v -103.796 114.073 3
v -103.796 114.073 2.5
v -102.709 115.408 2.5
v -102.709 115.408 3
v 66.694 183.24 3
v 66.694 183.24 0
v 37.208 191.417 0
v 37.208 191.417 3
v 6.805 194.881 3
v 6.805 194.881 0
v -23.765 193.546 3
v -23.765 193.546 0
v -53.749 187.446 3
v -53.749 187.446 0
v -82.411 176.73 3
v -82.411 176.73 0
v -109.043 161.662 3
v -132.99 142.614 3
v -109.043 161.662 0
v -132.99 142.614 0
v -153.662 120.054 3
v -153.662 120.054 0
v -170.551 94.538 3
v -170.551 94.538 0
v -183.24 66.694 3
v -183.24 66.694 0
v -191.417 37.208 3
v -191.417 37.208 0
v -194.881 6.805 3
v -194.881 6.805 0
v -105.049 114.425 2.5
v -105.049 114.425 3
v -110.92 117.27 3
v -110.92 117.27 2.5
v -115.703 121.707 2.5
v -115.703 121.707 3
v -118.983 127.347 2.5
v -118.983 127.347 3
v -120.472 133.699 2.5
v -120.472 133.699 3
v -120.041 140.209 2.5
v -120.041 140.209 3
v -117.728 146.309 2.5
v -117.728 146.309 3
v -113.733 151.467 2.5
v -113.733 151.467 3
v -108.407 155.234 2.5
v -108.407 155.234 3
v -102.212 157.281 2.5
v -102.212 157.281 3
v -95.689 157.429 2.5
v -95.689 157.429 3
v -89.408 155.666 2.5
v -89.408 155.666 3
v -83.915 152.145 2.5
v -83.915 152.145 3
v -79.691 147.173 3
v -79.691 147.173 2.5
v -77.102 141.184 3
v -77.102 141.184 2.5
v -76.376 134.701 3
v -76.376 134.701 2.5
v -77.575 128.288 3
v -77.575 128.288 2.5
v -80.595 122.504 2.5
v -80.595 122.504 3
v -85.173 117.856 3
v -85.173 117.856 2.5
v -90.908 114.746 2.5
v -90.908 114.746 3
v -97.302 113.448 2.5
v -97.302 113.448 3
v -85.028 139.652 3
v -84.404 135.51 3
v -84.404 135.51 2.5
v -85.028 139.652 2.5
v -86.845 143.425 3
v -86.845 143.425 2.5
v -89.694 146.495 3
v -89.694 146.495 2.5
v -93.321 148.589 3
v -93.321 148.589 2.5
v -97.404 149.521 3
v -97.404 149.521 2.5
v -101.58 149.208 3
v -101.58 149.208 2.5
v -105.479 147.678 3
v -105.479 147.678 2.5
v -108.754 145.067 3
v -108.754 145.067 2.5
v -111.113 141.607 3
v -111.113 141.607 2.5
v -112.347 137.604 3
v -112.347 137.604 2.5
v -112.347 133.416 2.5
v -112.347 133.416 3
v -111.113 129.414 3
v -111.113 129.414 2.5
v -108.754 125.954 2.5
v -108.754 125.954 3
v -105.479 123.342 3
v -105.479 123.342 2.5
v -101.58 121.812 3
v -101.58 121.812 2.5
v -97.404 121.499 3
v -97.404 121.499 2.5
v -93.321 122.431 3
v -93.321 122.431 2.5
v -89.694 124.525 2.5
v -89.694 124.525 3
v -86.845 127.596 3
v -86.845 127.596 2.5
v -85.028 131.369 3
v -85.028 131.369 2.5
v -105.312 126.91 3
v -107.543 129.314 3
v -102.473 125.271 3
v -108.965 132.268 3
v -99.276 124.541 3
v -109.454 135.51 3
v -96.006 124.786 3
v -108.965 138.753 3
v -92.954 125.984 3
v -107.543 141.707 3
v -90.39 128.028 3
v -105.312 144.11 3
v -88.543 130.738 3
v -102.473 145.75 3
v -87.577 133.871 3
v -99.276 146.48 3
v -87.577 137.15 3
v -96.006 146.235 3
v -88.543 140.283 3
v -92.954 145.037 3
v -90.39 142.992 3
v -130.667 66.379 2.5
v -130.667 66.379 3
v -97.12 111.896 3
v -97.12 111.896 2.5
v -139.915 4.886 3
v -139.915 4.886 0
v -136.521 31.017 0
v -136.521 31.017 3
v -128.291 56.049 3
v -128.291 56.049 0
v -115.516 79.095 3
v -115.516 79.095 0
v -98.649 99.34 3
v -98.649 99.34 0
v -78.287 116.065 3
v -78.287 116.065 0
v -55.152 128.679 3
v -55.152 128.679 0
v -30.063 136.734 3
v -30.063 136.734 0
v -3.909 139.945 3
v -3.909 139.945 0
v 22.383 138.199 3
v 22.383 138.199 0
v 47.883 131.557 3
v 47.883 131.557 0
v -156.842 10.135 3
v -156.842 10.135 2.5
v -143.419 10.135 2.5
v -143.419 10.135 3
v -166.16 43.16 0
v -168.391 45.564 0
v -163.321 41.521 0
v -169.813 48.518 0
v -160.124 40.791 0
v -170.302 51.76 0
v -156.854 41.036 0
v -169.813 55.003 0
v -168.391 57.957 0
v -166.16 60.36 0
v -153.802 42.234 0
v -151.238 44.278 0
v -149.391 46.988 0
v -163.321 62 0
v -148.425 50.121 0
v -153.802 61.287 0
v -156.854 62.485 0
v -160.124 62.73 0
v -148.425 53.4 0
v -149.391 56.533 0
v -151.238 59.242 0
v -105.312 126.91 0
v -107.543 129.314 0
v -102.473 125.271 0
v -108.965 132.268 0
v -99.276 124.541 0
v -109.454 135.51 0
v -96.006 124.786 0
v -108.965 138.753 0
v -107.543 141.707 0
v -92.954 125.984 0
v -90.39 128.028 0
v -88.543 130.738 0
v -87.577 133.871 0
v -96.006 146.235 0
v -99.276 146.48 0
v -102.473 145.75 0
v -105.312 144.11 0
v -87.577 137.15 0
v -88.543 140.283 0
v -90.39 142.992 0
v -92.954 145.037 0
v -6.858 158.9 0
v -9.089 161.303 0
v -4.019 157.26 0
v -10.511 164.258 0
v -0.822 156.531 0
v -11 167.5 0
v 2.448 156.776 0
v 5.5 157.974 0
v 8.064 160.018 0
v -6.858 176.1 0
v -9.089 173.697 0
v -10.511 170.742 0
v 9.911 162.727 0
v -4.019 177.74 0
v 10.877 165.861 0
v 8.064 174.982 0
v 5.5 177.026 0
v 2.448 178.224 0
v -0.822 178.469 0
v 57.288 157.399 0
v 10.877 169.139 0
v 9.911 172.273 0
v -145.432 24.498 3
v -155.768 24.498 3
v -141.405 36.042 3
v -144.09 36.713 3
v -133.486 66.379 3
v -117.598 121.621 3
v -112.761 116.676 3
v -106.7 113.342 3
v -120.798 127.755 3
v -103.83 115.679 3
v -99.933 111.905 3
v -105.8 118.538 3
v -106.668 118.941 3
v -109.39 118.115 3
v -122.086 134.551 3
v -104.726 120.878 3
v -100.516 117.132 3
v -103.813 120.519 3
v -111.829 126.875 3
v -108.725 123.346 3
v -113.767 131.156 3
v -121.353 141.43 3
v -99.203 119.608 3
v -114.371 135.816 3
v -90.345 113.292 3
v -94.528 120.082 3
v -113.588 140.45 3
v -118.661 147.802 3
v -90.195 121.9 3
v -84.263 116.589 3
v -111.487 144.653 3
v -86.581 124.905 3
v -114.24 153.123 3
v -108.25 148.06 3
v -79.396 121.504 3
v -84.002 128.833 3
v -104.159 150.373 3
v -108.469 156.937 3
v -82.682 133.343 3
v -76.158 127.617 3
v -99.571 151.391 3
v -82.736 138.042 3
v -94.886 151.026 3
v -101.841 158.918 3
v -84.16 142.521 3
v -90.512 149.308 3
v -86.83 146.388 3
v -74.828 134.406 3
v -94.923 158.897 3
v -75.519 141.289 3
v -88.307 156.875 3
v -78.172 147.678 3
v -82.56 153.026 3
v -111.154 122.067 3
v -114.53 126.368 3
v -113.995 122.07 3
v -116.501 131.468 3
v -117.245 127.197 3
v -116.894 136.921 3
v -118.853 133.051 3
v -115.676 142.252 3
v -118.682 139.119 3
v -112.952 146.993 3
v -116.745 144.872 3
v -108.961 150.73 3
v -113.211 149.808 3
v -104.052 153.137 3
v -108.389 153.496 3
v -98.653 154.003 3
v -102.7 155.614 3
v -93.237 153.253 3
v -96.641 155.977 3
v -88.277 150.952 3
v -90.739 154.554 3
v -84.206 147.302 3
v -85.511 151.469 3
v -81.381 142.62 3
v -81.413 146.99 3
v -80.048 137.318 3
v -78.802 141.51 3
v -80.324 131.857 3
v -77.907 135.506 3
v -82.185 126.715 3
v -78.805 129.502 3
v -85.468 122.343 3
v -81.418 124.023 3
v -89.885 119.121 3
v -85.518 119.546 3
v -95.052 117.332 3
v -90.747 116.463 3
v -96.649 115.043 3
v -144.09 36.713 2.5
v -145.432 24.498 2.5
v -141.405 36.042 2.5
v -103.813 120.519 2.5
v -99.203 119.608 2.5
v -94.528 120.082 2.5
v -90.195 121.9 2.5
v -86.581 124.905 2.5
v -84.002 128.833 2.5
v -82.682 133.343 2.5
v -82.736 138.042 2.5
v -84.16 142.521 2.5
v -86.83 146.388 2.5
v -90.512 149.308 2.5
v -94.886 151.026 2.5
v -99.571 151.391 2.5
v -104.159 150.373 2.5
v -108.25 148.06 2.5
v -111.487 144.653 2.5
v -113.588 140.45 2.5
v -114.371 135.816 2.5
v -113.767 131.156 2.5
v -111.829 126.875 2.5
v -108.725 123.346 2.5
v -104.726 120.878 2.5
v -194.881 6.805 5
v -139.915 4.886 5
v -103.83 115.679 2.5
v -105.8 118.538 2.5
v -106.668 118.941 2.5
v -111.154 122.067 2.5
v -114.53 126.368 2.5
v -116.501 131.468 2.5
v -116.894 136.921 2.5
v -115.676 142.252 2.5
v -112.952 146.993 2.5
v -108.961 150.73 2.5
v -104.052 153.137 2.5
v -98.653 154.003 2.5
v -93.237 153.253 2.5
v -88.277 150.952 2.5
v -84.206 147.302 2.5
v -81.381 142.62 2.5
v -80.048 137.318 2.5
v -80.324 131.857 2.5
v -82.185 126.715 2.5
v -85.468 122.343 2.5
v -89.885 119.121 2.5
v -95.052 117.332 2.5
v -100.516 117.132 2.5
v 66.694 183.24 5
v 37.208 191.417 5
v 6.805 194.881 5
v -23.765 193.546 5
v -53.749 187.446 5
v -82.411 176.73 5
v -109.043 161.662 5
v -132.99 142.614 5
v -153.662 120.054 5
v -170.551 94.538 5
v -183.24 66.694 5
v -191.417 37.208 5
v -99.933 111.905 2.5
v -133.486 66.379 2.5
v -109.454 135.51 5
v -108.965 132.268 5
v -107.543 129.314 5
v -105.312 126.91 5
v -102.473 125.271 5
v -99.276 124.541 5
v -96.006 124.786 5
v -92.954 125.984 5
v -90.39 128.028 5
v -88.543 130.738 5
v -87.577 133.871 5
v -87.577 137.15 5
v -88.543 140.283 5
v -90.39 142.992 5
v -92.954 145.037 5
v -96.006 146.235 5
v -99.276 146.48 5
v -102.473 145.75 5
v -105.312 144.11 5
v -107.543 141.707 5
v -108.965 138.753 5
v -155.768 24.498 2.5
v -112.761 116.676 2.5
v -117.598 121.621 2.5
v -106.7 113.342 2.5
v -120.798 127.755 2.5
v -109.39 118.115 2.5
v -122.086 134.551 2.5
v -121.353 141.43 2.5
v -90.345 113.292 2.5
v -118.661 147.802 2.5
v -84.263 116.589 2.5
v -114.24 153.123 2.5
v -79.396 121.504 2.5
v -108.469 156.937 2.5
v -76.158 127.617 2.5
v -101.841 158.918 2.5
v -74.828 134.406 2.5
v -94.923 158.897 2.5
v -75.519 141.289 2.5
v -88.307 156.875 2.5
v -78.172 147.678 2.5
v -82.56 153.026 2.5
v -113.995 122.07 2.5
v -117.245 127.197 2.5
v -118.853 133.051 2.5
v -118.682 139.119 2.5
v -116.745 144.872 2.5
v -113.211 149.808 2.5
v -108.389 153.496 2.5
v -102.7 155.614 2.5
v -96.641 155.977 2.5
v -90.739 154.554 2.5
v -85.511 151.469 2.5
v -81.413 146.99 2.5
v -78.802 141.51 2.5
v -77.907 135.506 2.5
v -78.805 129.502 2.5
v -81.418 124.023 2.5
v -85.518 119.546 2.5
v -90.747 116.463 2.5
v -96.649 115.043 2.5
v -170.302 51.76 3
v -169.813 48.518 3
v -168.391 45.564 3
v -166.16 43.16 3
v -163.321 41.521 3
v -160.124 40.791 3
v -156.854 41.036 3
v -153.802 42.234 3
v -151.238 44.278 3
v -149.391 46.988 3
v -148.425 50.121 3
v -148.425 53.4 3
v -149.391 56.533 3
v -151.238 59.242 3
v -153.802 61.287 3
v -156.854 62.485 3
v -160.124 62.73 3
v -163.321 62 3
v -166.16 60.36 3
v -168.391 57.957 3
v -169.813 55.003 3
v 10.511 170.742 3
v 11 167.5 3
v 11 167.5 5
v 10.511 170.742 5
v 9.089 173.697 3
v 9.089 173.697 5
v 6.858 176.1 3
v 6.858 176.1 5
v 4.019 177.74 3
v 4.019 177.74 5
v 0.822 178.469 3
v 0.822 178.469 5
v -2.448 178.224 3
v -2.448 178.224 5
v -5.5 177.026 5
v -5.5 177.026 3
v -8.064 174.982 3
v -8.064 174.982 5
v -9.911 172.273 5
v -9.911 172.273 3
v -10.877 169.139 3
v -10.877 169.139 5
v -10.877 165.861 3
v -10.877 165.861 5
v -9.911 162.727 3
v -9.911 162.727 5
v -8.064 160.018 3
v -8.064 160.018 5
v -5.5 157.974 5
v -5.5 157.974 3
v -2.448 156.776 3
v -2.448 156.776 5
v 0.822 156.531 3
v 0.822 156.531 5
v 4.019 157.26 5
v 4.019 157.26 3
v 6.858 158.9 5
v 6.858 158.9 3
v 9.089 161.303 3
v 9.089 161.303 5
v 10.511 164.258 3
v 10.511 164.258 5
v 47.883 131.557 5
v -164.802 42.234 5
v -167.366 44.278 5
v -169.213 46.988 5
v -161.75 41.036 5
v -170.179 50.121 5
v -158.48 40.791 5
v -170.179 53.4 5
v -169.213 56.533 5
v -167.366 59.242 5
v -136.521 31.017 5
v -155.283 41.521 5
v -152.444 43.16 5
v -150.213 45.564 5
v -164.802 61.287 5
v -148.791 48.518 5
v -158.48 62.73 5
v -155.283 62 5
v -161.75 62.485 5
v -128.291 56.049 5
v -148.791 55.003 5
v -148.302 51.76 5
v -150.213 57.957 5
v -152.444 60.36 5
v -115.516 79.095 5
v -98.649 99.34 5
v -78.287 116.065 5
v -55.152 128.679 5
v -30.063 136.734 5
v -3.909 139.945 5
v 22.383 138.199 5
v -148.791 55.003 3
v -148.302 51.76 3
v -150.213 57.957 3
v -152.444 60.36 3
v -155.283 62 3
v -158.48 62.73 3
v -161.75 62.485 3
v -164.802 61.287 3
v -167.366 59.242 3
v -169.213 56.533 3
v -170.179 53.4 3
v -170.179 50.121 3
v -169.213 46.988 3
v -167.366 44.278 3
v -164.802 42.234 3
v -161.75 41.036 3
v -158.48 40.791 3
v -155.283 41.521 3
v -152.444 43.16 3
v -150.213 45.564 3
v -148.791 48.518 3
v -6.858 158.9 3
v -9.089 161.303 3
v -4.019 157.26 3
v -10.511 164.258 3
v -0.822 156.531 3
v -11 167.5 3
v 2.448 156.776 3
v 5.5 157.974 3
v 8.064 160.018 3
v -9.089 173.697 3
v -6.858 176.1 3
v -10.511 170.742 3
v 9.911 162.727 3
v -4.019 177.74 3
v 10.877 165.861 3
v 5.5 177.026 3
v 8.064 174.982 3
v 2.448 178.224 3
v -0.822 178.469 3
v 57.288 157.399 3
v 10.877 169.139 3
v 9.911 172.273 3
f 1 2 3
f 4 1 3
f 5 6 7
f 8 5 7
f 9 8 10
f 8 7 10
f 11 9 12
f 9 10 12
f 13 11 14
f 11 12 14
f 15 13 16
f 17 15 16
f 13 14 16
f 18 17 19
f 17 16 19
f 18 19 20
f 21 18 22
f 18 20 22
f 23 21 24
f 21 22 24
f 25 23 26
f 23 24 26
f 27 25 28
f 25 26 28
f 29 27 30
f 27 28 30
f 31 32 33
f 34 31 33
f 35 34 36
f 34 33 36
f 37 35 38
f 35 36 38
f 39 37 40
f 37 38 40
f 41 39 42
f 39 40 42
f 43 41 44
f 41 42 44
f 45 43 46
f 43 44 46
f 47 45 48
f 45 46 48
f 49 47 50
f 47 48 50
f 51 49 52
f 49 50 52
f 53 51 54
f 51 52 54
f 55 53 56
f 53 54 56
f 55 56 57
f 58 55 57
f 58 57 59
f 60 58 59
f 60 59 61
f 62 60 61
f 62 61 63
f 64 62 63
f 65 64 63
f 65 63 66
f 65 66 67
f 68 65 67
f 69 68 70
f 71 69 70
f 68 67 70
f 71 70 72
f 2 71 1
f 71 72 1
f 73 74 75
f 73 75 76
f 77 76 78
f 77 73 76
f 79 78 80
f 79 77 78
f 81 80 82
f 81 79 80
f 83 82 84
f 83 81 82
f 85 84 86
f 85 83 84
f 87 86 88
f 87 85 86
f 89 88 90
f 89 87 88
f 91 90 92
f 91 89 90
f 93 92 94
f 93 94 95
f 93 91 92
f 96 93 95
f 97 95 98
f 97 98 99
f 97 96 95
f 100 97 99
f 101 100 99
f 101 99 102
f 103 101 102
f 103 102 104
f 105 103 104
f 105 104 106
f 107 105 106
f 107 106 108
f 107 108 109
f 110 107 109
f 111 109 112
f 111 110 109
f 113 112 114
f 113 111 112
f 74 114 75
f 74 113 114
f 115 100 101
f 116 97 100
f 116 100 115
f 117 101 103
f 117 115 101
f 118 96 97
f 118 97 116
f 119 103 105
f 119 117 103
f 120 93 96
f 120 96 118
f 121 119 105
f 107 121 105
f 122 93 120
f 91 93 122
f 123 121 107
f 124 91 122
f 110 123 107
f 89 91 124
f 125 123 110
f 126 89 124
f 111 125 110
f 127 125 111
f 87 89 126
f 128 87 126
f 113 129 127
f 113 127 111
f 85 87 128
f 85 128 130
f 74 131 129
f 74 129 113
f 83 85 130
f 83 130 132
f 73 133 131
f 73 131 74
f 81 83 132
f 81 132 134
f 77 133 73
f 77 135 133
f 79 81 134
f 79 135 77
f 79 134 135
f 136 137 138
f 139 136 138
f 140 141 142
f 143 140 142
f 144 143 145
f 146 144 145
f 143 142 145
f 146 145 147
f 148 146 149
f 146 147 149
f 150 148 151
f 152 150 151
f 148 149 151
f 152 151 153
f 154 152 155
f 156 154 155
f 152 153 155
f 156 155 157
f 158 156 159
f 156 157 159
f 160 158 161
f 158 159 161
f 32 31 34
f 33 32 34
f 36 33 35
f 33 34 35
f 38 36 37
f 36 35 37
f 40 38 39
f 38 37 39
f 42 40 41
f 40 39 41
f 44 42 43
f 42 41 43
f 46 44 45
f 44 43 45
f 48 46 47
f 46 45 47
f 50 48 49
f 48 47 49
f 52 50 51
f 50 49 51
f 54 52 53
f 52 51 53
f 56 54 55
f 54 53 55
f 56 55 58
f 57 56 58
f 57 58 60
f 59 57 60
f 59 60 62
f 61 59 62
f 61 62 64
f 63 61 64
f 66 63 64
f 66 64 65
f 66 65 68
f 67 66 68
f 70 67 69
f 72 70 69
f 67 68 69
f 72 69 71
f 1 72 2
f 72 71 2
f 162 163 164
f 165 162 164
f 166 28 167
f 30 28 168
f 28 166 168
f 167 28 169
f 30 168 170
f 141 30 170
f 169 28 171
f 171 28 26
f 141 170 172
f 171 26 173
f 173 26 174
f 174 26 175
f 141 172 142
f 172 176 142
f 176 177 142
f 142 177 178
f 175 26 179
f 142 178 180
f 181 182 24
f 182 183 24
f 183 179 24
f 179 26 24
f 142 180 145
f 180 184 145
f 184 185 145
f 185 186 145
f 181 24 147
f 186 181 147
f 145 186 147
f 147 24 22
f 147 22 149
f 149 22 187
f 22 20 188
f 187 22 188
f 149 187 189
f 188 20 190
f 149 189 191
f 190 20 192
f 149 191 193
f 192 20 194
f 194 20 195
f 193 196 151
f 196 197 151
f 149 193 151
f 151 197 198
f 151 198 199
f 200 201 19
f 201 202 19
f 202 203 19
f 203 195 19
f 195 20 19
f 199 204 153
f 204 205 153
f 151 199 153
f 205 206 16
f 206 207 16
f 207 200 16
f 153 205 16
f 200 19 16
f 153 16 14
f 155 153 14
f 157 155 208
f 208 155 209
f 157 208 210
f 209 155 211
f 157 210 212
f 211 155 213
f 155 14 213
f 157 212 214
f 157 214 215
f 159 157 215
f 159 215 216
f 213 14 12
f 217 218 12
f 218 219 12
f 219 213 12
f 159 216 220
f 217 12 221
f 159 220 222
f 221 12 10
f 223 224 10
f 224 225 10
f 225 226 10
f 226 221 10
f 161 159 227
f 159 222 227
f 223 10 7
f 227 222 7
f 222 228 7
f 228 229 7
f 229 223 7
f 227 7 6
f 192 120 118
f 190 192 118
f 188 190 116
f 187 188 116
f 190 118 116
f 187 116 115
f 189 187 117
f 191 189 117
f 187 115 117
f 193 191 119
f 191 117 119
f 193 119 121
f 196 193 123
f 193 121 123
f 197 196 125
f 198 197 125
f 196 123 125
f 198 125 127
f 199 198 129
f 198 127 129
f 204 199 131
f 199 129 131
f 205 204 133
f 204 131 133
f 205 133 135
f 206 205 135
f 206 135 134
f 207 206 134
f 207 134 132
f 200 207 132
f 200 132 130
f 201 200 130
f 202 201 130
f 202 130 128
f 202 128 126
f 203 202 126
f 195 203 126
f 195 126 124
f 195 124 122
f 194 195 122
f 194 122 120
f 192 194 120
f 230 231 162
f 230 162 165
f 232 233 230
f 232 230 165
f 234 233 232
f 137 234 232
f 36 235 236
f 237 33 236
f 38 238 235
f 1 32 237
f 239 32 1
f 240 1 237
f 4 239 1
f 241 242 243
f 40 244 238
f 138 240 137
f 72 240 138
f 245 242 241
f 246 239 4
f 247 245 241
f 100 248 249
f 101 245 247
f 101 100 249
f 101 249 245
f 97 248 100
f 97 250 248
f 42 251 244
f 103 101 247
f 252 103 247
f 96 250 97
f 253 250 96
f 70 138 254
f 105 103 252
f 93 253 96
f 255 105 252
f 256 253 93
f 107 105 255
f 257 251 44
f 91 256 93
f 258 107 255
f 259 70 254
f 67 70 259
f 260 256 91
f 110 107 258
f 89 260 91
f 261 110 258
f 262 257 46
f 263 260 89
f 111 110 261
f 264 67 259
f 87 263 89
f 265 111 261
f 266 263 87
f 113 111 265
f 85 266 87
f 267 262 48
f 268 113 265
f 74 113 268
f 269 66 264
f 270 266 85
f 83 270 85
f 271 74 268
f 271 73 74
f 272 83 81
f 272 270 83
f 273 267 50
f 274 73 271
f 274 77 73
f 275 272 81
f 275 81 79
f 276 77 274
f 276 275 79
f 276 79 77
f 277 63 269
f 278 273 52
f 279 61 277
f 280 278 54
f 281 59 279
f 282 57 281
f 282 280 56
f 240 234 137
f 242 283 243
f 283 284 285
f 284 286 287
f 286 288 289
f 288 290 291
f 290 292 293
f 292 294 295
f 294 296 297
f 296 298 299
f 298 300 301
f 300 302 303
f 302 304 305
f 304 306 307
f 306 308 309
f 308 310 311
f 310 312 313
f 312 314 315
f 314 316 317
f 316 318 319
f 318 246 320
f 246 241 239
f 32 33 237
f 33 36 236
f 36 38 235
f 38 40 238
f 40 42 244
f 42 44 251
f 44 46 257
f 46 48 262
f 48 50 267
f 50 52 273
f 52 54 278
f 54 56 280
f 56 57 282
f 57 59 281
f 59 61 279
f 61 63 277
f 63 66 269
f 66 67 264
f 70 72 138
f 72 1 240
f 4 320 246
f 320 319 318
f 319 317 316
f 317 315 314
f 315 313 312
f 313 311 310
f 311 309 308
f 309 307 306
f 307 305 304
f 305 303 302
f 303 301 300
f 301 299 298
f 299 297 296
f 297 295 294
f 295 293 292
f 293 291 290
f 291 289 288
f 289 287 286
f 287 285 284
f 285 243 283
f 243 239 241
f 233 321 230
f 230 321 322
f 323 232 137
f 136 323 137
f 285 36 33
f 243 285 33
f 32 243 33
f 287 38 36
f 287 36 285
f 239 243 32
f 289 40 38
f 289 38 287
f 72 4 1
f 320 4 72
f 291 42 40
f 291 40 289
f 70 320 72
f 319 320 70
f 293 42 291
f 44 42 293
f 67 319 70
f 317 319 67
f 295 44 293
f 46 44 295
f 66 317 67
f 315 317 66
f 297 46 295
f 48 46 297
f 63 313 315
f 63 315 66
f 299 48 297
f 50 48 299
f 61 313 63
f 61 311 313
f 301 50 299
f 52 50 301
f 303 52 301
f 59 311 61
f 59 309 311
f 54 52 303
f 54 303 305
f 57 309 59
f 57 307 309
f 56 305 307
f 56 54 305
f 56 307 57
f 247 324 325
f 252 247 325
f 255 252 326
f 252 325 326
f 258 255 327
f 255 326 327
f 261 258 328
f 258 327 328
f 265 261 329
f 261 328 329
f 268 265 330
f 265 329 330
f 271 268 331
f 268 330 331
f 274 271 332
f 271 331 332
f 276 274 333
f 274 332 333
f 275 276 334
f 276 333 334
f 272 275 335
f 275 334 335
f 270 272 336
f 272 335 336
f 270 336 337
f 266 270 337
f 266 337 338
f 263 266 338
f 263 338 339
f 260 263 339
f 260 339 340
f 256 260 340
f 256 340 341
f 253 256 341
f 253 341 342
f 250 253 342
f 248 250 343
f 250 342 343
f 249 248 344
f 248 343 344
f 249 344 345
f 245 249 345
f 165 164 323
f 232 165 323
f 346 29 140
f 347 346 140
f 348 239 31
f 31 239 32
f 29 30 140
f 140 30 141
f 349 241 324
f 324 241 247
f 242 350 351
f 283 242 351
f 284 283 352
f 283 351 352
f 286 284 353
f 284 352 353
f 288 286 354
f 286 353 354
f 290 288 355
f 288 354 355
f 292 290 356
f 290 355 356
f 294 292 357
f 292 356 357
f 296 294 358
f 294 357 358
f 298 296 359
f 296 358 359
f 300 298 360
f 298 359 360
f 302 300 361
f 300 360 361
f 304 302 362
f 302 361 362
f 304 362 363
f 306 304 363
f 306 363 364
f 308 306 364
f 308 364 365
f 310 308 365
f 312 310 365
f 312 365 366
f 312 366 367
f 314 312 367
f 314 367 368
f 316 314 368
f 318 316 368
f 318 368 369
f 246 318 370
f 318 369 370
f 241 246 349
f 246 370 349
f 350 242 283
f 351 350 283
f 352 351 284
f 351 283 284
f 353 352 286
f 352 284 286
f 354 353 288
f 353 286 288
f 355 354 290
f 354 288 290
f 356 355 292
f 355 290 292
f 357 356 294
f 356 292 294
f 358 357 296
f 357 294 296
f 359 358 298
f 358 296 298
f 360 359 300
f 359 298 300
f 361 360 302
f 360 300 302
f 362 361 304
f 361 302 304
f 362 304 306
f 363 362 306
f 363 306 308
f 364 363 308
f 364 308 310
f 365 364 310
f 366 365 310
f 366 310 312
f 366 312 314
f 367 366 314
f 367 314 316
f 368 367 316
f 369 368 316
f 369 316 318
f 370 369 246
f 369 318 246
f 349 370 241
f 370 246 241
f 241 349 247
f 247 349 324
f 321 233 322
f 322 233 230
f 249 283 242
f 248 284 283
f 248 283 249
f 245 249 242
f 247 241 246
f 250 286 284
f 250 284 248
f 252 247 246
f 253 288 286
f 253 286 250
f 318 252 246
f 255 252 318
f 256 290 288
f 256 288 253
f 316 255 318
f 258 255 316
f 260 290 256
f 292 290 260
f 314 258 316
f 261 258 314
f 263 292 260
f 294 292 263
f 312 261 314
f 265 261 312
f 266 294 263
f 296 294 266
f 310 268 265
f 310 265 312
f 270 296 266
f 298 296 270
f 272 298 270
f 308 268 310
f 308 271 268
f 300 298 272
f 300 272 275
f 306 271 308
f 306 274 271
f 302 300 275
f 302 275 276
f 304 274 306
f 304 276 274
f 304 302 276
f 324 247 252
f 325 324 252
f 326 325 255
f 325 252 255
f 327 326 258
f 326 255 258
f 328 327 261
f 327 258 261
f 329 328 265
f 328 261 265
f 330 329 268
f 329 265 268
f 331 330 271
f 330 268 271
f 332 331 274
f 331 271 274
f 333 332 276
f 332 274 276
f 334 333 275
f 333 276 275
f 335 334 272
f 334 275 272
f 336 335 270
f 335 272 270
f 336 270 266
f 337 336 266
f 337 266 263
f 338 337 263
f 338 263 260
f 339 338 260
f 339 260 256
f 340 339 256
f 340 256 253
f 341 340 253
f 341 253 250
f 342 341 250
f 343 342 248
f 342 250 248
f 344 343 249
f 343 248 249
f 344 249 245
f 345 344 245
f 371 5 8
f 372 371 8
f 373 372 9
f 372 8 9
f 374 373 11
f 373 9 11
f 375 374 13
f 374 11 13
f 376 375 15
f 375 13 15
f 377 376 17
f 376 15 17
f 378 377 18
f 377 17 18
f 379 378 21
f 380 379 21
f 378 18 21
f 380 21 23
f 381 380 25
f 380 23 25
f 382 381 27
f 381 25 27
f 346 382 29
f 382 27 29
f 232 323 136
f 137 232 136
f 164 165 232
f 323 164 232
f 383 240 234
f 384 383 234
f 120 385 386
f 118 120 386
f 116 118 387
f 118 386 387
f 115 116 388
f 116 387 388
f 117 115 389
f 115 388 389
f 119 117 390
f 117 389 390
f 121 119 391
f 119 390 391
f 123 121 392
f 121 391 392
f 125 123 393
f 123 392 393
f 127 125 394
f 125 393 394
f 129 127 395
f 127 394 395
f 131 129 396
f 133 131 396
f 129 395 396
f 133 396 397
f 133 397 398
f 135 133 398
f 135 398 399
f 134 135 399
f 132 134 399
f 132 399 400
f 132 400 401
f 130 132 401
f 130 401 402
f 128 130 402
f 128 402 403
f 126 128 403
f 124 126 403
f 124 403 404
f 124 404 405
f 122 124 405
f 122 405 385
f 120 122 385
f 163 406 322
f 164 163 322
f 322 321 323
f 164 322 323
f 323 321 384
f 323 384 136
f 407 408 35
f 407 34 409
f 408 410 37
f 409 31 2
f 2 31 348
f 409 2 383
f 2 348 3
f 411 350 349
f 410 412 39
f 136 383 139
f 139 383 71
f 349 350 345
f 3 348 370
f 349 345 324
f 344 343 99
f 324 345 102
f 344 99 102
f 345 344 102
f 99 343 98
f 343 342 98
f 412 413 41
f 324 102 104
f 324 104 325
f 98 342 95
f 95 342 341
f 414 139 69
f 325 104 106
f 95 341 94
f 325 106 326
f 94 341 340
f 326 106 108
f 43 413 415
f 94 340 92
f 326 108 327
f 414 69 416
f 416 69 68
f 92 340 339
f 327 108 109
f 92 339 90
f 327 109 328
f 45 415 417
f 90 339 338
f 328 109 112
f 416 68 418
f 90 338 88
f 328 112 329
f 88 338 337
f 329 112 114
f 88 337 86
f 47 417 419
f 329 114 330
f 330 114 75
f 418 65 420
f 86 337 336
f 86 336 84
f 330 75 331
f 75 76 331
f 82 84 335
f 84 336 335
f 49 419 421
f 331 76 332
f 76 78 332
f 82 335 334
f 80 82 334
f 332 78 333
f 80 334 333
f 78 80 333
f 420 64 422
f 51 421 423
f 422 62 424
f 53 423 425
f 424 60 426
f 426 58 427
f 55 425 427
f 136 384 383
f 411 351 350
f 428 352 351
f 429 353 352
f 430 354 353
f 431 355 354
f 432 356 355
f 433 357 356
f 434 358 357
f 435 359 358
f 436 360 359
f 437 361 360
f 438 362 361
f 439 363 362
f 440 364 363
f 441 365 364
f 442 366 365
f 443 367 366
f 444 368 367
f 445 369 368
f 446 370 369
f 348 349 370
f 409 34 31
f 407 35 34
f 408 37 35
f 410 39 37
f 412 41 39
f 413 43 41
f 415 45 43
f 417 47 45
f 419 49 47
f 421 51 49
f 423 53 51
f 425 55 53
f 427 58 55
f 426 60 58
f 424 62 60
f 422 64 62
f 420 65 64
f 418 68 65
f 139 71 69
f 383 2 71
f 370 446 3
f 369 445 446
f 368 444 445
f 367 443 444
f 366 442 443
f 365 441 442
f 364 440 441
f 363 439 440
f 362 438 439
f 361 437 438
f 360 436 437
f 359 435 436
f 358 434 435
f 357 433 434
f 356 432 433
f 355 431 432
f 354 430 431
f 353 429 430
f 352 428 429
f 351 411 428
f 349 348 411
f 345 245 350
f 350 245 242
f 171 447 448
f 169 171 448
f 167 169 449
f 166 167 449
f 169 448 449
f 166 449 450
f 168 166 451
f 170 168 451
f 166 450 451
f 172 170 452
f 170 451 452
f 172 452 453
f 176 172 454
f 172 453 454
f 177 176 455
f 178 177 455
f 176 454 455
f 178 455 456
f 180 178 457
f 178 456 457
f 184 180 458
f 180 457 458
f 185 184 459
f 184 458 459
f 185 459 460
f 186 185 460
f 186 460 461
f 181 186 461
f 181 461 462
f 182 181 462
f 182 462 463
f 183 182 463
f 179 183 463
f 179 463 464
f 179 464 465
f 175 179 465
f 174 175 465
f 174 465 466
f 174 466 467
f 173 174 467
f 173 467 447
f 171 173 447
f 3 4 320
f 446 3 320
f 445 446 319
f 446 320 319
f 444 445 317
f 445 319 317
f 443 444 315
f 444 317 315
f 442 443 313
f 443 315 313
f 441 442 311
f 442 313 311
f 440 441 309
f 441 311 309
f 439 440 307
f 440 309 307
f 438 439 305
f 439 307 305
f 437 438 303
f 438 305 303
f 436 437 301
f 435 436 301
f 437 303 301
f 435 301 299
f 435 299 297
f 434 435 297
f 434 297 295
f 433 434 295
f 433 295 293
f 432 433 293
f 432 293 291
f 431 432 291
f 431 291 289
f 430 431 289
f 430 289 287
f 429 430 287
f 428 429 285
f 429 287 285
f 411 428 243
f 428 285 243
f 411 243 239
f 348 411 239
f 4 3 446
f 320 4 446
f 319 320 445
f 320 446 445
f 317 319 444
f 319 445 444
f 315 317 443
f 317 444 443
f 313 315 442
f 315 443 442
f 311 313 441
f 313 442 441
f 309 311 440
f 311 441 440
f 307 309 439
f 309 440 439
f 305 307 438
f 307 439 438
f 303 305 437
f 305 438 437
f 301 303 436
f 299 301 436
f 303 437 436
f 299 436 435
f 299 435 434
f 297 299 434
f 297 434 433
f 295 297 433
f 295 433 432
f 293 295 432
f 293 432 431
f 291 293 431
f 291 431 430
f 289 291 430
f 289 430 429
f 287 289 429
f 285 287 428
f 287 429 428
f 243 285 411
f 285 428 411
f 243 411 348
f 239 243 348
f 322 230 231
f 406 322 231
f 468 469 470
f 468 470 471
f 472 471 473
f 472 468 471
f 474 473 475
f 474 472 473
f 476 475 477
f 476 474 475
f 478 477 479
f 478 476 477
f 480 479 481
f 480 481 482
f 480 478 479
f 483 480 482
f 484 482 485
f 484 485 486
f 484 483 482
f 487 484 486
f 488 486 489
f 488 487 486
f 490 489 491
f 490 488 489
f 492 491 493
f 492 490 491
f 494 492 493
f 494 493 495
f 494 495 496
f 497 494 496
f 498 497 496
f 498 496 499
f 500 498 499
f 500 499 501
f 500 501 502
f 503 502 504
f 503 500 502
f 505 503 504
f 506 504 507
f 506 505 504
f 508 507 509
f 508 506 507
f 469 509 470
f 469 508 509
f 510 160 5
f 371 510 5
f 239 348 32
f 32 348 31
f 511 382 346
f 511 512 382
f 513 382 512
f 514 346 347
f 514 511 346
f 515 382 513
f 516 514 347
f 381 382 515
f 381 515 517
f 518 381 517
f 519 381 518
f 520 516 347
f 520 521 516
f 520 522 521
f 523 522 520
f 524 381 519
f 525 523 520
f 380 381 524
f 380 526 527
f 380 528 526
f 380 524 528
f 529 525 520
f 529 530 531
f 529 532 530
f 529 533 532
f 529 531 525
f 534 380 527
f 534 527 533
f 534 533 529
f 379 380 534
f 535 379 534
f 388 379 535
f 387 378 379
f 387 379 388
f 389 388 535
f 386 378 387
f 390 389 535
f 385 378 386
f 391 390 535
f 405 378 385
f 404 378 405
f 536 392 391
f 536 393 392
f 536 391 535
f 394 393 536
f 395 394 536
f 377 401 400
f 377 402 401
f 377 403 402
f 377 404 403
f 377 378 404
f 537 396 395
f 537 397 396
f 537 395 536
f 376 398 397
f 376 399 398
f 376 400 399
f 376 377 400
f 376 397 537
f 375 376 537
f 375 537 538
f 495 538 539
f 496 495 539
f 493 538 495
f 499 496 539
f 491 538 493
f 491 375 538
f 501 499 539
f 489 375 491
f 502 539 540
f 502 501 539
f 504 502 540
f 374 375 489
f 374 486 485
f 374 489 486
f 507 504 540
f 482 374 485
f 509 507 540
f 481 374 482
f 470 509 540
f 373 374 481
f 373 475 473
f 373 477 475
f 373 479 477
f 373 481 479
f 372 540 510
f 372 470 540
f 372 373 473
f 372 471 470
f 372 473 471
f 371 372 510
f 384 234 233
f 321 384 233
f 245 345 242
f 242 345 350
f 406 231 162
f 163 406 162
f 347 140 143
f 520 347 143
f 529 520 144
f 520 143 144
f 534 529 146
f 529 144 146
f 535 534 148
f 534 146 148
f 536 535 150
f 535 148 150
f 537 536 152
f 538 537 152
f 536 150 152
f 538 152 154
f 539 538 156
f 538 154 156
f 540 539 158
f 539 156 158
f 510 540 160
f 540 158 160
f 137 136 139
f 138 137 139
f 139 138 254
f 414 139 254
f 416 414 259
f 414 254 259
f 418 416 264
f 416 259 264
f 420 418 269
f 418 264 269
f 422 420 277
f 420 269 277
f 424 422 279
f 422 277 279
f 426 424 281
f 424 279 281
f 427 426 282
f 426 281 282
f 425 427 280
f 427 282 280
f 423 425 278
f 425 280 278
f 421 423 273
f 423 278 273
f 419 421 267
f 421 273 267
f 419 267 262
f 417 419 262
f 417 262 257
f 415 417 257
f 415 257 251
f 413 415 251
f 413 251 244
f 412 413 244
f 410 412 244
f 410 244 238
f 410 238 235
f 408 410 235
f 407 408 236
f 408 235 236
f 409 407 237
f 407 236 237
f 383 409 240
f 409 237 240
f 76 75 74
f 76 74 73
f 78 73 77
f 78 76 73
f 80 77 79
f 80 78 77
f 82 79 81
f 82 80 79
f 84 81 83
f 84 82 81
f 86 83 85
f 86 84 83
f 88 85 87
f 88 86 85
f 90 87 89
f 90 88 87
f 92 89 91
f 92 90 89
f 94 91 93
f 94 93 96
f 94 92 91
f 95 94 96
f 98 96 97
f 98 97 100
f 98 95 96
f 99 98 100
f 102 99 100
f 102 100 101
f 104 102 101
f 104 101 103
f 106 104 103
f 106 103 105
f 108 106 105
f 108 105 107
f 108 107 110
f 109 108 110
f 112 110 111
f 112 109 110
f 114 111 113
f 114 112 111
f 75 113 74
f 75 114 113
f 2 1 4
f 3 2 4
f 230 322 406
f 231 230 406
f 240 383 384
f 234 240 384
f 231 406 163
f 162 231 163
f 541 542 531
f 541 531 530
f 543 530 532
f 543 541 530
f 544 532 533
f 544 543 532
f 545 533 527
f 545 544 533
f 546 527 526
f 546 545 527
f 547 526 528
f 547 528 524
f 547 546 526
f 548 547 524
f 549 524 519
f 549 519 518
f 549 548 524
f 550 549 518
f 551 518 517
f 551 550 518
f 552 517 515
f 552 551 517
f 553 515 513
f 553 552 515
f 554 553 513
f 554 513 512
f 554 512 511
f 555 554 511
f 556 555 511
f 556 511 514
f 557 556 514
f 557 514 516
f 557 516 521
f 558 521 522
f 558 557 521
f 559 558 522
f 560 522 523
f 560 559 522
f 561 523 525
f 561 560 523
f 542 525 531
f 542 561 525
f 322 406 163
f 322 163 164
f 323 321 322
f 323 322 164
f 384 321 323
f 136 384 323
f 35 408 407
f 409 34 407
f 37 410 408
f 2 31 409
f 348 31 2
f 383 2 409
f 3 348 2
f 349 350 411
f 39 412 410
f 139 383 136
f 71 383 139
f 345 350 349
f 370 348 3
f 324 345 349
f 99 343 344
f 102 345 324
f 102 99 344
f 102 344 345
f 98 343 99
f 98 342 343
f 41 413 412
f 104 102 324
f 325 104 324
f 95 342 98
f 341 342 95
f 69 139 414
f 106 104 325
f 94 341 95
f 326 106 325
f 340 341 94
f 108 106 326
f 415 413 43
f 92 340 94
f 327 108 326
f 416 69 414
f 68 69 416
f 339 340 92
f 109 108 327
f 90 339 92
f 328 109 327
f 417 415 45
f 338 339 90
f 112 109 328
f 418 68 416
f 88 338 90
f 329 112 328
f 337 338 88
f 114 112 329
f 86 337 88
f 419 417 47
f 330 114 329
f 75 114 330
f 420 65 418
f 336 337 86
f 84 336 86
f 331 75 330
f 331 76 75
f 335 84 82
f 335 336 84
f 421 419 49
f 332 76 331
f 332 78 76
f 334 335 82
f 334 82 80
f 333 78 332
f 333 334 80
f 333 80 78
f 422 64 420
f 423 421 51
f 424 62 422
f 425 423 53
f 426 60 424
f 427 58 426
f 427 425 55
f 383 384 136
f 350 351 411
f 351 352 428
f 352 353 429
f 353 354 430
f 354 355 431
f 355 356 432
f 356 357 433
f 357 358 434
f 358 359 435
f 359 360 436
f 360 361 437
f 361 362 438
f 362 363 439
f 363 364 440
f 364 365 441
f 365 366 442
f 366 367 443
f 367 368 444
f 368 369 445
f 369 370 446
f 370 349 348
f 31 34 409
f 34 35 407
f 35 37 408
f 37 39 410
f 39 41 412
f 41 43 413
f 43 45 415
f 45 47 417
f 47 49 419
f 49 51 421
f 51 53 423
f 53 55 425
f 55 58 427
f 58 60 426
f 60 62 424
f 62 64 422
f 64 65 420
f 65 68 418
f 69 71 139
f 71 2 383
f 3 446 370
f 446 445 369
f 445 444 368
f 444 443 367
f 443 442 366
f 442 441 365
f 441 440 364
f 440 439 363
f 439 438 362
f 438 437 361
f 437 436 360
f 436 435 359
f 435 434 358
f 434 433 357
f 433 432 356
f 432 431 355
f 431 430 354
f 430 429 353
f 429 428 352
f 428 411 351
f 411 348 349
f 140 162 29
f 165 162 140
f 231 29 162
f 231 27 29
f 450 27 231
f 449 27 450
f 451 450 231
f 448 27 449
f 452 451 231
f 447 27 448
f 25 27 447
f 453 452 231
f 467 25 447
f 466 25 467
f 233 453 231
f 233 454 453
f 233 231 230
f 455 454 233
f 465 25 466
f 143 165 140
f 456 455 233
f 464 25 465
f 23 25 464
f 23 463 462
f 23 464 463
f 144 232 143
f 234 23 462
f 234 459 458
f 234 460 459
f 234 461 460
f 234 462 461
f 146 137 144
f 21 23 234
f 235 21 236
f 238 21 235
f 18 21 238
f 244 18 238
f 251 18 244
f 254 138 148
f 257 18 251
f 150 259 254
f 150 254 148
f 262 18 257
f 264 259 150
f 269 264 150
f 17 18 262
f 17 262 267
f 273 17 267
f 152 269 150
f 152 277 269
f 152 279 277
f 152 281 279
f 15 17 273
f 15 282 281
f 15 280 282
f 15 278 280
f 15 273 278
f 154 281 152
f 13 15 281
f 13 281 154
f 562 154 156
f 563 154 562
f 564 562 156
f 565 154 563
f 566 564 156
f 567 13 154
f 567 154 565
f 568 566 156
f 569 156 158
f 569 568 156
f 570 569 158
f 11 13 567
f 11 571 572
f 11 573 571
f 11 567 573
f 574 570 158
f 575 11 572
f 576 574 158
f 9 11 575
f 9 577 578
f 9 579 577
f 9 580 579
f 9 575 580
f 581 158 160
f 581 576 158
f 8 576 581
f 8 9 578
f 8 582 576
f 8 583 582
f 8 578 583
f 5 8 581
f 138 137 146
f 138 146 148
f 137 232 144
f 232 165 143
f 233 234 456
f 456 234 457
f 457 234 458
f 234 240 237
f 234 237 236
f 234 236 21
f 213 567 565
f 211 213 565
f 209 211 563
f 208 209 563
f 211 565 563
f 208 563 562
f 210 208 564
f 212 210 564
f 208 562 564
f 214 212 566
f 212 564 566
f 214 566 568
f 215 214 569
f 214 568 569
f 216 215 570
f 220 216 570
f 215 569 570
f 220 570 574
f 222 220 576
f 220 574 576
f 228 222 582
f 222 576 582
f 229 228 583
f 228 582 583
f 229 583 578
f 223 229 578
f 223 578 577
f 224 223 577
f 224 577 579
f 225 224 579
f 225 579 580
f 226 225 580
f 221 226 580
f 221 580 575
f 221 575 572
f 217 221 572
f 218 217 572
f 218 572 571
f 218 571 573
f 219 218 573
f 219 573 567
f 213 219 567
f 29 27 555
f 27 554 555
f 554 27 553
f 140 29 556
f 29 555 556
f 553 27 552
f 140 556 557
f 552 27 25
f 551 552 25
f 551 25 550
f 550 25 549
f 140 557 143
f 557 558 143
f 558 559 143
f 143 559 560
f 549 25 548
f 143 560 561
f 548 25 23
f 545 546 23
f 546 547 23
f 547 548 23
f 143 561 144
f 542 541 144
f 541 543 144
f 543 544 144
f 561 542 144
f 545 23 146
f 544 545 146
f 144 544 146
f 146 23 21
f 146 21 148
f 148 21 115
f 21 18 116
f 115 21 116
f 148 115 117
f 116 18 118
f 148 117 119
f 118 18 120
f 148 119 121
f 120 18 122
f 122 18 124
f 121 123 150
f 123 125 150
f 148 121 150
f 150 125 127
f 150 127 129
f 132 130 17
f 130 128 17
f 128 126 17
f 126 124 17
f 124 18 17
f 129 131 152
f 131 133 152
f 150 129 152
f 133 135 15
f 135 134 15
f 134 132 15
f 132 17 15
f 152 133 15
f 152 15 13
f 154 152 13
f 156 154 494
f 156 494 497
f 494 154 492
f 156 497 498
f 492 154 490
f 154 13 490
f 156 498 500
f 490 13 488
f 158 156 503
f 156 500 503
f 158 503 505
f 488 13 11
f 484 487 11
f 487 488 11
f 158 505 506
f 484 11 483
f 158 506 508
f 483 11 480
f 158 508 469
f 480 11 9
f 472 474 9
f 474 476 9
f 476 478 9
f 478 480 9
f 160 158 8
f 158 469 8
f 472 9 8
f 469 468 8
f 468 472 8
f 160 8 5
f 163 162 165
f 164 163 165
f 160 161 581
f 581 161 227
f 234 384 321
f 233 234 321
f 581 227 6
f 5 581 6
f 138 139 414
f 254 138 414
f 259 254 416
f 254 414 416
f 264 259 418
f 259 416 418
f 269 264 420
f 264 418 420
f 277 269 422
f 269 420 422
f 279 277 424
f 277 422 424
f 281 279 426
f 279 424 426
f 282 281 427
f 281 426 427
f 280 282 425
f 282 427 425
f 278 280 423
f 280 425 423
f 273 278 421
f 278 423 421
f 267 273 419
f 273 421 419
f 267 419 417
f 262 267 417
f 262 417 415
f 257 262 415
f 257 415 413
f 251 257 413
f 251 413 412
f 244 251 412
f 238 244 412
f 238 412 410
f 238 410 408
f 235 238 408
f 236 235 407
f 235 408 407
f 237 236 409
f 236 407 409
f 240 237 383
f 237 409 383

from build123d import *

# Parameters (mm, degrees)
F1_DEPTH = 3
F2_D     = 22
F3_R     = 14.0502268528
F4_DEPTH = 0.5
F5_DEPTH = 0.5
F6_R     = 11
F7_DEPTH = 2
F8_D     = 22


with BuildPart() as f1:
    # F0 (on Top) → F1 (new body)
    with BuildSketch(Plane.XY):
        with BuildLine():
            Line((47.8828200656, 131.55696691), (57.288374007, 157.3985139816))
            ThreePointArc((57.288374007, 157.3985139816), (-93.6648113313, 138.863793403), (-167.3979635257, 5.8456656977))
            Line((-167.3979635257, 5.8456656977), (-139.9147157827, 4.8859295384))
            ThreePointArc((-139.9147157827, 4.8859295384), (-78.2870064859, 116.0652601577), (47.8828200656, 131.55696691))
        make_face()
        with BuildLine():
            Line((57.288374007, 157.3985139816), (66.6939279485, 183.2400610533))
            ThreePointArc((66.6939279485, 183.2400610533), (-109.0426161768, 161.6623266482), (-194.8812112687, 6.805401857))
            Line((-194.8812112687, 6.805401857), (-167.3979635257, 5.8456656977))
            ThreePointArc((-167.3979635257, 5.8456656977), (-93.6648113313, 138.863793403), (57.288374007, 157.3985139816))
        make_face()
    extrude(amount=F1_DEPTH)

    # F2 (through all)
    with Locations(Plane(origin=(0, 0, 0), x_dir=(1, 0, 0), z_dir=(0, 0, -1))):
        with Locations((0, -167.5), (-98.454029759, -135.5103465578), (-159.3019664794, -51.7603465578)):
            Hole(F2_D / 2)

    # F3 (on face) → F4 (cut)
    with BuildSketch(Plane.XY.offset(3)):
        with BuildLine():
            Line((-130.6667327881, 66.3785785437), (-97.1204983456, 111.8961327317))
            ThreePointArc((-97.1204983456, 111.8961327317), (-98.3811733807, 159.1620714971), (-99.9330161444, 111.9047963645))
            Line((-99.9330161444, 111.9047963645), (-133.4856301546, 66.3785859942))
            Line((-133.4856301546, 66.3785859942), (-144.0900415182, 36.7130823433))
            Line((-144.0900415182, 36.7130823433), (-145.4323679209, 24.4978740811))
            Line((-145.4323679209, 24.4978740811), (-155.7683050632, 24.4978740811))
            Line((-155.7683050632, 24.4978740811), (-156.8421721458, 10.1349400356))
            Line((-156.8421721458, 10.1349400356), (-143.4188783169, 10.1349400356))
            Line((-143.4188783169, 10.1349400356), (-141.4053738117, 36.0419154167))
            Line((-141.4053738117, 36.0419154167), (-130.6667327881, 66.3785785437))
        make_face()
        with BuildLine():
            Line((-103.796297282, 114.0733726617), (-102.7086136493, 115.4084704753))
            ThreePointArc((-102.7086136493, 115.4084704753), (-93.637046648, 155.4849198905), (-103.829618412, 115.6788072139))
            Line((-103.829618412, 115.6788072139), (-105.0485776566, 114.4249105857))
            ThreePointArc((-105.0485776566, 114.4249105857), (-92.4830344212, 156.7807693741), (-103.796297282, 114.0733726617))
        make_face(mode=Mode.SUBTRACT)
        with BuildLine():
            Line((-105.7998637189, 118.5376641197), (-103.8133112073, 120.5193363676))
            ThreePointArc((-103.8133112073, 120.5193363676), (-92.6354913449, 150.3291486311), (-104.7263022811, 120.8778183562))
            Line((-104.7263022811, 120.8778183562), (-106.6683445703, 118.9405469847))
            ThreePointArc((-106.6683445703, 118.9405469847), (-90.6713479528, 152.287208291), (-105.7998637189, 118.5376641197))
        make_face(mode=Mode.SUBTRACT)
        with Locations((-98.454029759, 135.5103465578)):
            Circle(F3_R, mode=Mode.SUBTRACT)
    extrude(amount=-F4_DEPTH, mode=Mode.SUBTRACT)


with BuildPart() as f5:
    # F5 (new): a face of the model
    f5_faces = [f1.part.faces().sort_by_distance(p)[0] for p in [
        (-137.6397122741, 51.7779138319, 2.5),
    ]]
    extrude(f5_faces, amount=F5_DEPTH)


with BuildPart() as f7:
    # F6 (on face) → F7 (new body)
    with BuildSketch(Plane.XY.offset(3)):
        with BuildLine():
            Line((-194.8812112687, 6.805401857), (-139.9147157827, 4.8859295384))
            ThreePointArc((-139.9147157827, 4.8859295384), (-78.2870064859, 116.0652601577), (47.8828200656, 131.55696691))
            Line((47.8828200656, 131.55696691), (66.6939279485, 183.2400610533))
            ThreePointArc((66.6939279485, 183.2400610533), (-109.0426161768, 161.6623266482), (-194.8812112687, 6.805401857))
        make_face()
        with Locations((-159.3019664794, 51.7603465578)):
            Circle(F6_R, mode=Mode.SUBTRACT)
        with BuildLine():
            Line((-97.1204983456, 111.8961327317), (-130.6667327881, 66.3785785437))
            Line((-130.6667327881, 66.3785785437), (-141.4053738117, 36.0419154167))
            Line((-141.4053738117, 36.0419154167), (-143.4188783169, 10.1349400356))
            Line((-143.4188783169, 10.1349400356), (-156.8421721458, 10.1349400356))
            Line((-156.8421721458, 10.1349400356), (-155.7683050632, 24.4978740811))
            Line((-155.7683050632, 24.4978740811), (-145.4323679209, 24.4978740811))
            Line((-145.4323679209, 24.4978740811), (-144.0900415182, 36.7130823433))
            Line((-144.0900415182, 36.7130823433), (-133.4856301546, 66.3785859942))
            Line((-133.4856301546, 66.3785859942), (-99.9330161444, 111.9047963645))
            ThreePointArc((-99.9330161444, 111.9047963645), (-98.3811733807, 159.1620714971), (-97.1204983456, 111.8961327317))
        make_face(mode=Mode.SUBTRACT)
        with Locations((0, 167.5)):
            Circle(F6_R, mode=Mode.SUBTRACT)
        with BuildLine():
            Line((-141.4053738117, 36.0419154167), (-130.6667327881, 66.3785785437))
            Line((-130.6667327881, 66.3785785437), (-97.1204983456, 111.8961327317))
            ThreePointArc((-97.1204983456, 111.8961327317), (-98.3811733807, 159.1620714971), (-99.9330161444, 111.9047963645))
            Line((-99.9330161444, 111.9047963645), (-133.4856301546, 66.3785859942))
            Line((-133.4856301546, 66.3785859942), (-144.0900415182, 36.7130823433))
            Line((-144.0900415182, 36.7130823433), (-145.4323679209, 24.4978740811))
            Line((-145.4323679209, 24.4978740811), (-155.7683050632, 24.4978740811))
            Line((-155.7683050632, 24.4978740811), (-156.8421721458, 10.1349400356))
            Line((-156.8421721458, 10.1349400356), (-143.4188783169, 10.1349400356))
            Line((-143.4188783169, 10.1349400356), (-141.4053738117, 36.0419154167))
        make_face()
    extrude(amount=F7_DEPTH)

    # F8 (through all)
    with Locations(Plane(origin=(0, 0, 0), x_dir=(1, 0, 0), z_dir=(0, 0, -1))):
        with Locations((-98.454029759, -135.5103465578)):
            Hole(F8_D / 2)


solid = Compound([f1.part, f5.part, f7.part])
